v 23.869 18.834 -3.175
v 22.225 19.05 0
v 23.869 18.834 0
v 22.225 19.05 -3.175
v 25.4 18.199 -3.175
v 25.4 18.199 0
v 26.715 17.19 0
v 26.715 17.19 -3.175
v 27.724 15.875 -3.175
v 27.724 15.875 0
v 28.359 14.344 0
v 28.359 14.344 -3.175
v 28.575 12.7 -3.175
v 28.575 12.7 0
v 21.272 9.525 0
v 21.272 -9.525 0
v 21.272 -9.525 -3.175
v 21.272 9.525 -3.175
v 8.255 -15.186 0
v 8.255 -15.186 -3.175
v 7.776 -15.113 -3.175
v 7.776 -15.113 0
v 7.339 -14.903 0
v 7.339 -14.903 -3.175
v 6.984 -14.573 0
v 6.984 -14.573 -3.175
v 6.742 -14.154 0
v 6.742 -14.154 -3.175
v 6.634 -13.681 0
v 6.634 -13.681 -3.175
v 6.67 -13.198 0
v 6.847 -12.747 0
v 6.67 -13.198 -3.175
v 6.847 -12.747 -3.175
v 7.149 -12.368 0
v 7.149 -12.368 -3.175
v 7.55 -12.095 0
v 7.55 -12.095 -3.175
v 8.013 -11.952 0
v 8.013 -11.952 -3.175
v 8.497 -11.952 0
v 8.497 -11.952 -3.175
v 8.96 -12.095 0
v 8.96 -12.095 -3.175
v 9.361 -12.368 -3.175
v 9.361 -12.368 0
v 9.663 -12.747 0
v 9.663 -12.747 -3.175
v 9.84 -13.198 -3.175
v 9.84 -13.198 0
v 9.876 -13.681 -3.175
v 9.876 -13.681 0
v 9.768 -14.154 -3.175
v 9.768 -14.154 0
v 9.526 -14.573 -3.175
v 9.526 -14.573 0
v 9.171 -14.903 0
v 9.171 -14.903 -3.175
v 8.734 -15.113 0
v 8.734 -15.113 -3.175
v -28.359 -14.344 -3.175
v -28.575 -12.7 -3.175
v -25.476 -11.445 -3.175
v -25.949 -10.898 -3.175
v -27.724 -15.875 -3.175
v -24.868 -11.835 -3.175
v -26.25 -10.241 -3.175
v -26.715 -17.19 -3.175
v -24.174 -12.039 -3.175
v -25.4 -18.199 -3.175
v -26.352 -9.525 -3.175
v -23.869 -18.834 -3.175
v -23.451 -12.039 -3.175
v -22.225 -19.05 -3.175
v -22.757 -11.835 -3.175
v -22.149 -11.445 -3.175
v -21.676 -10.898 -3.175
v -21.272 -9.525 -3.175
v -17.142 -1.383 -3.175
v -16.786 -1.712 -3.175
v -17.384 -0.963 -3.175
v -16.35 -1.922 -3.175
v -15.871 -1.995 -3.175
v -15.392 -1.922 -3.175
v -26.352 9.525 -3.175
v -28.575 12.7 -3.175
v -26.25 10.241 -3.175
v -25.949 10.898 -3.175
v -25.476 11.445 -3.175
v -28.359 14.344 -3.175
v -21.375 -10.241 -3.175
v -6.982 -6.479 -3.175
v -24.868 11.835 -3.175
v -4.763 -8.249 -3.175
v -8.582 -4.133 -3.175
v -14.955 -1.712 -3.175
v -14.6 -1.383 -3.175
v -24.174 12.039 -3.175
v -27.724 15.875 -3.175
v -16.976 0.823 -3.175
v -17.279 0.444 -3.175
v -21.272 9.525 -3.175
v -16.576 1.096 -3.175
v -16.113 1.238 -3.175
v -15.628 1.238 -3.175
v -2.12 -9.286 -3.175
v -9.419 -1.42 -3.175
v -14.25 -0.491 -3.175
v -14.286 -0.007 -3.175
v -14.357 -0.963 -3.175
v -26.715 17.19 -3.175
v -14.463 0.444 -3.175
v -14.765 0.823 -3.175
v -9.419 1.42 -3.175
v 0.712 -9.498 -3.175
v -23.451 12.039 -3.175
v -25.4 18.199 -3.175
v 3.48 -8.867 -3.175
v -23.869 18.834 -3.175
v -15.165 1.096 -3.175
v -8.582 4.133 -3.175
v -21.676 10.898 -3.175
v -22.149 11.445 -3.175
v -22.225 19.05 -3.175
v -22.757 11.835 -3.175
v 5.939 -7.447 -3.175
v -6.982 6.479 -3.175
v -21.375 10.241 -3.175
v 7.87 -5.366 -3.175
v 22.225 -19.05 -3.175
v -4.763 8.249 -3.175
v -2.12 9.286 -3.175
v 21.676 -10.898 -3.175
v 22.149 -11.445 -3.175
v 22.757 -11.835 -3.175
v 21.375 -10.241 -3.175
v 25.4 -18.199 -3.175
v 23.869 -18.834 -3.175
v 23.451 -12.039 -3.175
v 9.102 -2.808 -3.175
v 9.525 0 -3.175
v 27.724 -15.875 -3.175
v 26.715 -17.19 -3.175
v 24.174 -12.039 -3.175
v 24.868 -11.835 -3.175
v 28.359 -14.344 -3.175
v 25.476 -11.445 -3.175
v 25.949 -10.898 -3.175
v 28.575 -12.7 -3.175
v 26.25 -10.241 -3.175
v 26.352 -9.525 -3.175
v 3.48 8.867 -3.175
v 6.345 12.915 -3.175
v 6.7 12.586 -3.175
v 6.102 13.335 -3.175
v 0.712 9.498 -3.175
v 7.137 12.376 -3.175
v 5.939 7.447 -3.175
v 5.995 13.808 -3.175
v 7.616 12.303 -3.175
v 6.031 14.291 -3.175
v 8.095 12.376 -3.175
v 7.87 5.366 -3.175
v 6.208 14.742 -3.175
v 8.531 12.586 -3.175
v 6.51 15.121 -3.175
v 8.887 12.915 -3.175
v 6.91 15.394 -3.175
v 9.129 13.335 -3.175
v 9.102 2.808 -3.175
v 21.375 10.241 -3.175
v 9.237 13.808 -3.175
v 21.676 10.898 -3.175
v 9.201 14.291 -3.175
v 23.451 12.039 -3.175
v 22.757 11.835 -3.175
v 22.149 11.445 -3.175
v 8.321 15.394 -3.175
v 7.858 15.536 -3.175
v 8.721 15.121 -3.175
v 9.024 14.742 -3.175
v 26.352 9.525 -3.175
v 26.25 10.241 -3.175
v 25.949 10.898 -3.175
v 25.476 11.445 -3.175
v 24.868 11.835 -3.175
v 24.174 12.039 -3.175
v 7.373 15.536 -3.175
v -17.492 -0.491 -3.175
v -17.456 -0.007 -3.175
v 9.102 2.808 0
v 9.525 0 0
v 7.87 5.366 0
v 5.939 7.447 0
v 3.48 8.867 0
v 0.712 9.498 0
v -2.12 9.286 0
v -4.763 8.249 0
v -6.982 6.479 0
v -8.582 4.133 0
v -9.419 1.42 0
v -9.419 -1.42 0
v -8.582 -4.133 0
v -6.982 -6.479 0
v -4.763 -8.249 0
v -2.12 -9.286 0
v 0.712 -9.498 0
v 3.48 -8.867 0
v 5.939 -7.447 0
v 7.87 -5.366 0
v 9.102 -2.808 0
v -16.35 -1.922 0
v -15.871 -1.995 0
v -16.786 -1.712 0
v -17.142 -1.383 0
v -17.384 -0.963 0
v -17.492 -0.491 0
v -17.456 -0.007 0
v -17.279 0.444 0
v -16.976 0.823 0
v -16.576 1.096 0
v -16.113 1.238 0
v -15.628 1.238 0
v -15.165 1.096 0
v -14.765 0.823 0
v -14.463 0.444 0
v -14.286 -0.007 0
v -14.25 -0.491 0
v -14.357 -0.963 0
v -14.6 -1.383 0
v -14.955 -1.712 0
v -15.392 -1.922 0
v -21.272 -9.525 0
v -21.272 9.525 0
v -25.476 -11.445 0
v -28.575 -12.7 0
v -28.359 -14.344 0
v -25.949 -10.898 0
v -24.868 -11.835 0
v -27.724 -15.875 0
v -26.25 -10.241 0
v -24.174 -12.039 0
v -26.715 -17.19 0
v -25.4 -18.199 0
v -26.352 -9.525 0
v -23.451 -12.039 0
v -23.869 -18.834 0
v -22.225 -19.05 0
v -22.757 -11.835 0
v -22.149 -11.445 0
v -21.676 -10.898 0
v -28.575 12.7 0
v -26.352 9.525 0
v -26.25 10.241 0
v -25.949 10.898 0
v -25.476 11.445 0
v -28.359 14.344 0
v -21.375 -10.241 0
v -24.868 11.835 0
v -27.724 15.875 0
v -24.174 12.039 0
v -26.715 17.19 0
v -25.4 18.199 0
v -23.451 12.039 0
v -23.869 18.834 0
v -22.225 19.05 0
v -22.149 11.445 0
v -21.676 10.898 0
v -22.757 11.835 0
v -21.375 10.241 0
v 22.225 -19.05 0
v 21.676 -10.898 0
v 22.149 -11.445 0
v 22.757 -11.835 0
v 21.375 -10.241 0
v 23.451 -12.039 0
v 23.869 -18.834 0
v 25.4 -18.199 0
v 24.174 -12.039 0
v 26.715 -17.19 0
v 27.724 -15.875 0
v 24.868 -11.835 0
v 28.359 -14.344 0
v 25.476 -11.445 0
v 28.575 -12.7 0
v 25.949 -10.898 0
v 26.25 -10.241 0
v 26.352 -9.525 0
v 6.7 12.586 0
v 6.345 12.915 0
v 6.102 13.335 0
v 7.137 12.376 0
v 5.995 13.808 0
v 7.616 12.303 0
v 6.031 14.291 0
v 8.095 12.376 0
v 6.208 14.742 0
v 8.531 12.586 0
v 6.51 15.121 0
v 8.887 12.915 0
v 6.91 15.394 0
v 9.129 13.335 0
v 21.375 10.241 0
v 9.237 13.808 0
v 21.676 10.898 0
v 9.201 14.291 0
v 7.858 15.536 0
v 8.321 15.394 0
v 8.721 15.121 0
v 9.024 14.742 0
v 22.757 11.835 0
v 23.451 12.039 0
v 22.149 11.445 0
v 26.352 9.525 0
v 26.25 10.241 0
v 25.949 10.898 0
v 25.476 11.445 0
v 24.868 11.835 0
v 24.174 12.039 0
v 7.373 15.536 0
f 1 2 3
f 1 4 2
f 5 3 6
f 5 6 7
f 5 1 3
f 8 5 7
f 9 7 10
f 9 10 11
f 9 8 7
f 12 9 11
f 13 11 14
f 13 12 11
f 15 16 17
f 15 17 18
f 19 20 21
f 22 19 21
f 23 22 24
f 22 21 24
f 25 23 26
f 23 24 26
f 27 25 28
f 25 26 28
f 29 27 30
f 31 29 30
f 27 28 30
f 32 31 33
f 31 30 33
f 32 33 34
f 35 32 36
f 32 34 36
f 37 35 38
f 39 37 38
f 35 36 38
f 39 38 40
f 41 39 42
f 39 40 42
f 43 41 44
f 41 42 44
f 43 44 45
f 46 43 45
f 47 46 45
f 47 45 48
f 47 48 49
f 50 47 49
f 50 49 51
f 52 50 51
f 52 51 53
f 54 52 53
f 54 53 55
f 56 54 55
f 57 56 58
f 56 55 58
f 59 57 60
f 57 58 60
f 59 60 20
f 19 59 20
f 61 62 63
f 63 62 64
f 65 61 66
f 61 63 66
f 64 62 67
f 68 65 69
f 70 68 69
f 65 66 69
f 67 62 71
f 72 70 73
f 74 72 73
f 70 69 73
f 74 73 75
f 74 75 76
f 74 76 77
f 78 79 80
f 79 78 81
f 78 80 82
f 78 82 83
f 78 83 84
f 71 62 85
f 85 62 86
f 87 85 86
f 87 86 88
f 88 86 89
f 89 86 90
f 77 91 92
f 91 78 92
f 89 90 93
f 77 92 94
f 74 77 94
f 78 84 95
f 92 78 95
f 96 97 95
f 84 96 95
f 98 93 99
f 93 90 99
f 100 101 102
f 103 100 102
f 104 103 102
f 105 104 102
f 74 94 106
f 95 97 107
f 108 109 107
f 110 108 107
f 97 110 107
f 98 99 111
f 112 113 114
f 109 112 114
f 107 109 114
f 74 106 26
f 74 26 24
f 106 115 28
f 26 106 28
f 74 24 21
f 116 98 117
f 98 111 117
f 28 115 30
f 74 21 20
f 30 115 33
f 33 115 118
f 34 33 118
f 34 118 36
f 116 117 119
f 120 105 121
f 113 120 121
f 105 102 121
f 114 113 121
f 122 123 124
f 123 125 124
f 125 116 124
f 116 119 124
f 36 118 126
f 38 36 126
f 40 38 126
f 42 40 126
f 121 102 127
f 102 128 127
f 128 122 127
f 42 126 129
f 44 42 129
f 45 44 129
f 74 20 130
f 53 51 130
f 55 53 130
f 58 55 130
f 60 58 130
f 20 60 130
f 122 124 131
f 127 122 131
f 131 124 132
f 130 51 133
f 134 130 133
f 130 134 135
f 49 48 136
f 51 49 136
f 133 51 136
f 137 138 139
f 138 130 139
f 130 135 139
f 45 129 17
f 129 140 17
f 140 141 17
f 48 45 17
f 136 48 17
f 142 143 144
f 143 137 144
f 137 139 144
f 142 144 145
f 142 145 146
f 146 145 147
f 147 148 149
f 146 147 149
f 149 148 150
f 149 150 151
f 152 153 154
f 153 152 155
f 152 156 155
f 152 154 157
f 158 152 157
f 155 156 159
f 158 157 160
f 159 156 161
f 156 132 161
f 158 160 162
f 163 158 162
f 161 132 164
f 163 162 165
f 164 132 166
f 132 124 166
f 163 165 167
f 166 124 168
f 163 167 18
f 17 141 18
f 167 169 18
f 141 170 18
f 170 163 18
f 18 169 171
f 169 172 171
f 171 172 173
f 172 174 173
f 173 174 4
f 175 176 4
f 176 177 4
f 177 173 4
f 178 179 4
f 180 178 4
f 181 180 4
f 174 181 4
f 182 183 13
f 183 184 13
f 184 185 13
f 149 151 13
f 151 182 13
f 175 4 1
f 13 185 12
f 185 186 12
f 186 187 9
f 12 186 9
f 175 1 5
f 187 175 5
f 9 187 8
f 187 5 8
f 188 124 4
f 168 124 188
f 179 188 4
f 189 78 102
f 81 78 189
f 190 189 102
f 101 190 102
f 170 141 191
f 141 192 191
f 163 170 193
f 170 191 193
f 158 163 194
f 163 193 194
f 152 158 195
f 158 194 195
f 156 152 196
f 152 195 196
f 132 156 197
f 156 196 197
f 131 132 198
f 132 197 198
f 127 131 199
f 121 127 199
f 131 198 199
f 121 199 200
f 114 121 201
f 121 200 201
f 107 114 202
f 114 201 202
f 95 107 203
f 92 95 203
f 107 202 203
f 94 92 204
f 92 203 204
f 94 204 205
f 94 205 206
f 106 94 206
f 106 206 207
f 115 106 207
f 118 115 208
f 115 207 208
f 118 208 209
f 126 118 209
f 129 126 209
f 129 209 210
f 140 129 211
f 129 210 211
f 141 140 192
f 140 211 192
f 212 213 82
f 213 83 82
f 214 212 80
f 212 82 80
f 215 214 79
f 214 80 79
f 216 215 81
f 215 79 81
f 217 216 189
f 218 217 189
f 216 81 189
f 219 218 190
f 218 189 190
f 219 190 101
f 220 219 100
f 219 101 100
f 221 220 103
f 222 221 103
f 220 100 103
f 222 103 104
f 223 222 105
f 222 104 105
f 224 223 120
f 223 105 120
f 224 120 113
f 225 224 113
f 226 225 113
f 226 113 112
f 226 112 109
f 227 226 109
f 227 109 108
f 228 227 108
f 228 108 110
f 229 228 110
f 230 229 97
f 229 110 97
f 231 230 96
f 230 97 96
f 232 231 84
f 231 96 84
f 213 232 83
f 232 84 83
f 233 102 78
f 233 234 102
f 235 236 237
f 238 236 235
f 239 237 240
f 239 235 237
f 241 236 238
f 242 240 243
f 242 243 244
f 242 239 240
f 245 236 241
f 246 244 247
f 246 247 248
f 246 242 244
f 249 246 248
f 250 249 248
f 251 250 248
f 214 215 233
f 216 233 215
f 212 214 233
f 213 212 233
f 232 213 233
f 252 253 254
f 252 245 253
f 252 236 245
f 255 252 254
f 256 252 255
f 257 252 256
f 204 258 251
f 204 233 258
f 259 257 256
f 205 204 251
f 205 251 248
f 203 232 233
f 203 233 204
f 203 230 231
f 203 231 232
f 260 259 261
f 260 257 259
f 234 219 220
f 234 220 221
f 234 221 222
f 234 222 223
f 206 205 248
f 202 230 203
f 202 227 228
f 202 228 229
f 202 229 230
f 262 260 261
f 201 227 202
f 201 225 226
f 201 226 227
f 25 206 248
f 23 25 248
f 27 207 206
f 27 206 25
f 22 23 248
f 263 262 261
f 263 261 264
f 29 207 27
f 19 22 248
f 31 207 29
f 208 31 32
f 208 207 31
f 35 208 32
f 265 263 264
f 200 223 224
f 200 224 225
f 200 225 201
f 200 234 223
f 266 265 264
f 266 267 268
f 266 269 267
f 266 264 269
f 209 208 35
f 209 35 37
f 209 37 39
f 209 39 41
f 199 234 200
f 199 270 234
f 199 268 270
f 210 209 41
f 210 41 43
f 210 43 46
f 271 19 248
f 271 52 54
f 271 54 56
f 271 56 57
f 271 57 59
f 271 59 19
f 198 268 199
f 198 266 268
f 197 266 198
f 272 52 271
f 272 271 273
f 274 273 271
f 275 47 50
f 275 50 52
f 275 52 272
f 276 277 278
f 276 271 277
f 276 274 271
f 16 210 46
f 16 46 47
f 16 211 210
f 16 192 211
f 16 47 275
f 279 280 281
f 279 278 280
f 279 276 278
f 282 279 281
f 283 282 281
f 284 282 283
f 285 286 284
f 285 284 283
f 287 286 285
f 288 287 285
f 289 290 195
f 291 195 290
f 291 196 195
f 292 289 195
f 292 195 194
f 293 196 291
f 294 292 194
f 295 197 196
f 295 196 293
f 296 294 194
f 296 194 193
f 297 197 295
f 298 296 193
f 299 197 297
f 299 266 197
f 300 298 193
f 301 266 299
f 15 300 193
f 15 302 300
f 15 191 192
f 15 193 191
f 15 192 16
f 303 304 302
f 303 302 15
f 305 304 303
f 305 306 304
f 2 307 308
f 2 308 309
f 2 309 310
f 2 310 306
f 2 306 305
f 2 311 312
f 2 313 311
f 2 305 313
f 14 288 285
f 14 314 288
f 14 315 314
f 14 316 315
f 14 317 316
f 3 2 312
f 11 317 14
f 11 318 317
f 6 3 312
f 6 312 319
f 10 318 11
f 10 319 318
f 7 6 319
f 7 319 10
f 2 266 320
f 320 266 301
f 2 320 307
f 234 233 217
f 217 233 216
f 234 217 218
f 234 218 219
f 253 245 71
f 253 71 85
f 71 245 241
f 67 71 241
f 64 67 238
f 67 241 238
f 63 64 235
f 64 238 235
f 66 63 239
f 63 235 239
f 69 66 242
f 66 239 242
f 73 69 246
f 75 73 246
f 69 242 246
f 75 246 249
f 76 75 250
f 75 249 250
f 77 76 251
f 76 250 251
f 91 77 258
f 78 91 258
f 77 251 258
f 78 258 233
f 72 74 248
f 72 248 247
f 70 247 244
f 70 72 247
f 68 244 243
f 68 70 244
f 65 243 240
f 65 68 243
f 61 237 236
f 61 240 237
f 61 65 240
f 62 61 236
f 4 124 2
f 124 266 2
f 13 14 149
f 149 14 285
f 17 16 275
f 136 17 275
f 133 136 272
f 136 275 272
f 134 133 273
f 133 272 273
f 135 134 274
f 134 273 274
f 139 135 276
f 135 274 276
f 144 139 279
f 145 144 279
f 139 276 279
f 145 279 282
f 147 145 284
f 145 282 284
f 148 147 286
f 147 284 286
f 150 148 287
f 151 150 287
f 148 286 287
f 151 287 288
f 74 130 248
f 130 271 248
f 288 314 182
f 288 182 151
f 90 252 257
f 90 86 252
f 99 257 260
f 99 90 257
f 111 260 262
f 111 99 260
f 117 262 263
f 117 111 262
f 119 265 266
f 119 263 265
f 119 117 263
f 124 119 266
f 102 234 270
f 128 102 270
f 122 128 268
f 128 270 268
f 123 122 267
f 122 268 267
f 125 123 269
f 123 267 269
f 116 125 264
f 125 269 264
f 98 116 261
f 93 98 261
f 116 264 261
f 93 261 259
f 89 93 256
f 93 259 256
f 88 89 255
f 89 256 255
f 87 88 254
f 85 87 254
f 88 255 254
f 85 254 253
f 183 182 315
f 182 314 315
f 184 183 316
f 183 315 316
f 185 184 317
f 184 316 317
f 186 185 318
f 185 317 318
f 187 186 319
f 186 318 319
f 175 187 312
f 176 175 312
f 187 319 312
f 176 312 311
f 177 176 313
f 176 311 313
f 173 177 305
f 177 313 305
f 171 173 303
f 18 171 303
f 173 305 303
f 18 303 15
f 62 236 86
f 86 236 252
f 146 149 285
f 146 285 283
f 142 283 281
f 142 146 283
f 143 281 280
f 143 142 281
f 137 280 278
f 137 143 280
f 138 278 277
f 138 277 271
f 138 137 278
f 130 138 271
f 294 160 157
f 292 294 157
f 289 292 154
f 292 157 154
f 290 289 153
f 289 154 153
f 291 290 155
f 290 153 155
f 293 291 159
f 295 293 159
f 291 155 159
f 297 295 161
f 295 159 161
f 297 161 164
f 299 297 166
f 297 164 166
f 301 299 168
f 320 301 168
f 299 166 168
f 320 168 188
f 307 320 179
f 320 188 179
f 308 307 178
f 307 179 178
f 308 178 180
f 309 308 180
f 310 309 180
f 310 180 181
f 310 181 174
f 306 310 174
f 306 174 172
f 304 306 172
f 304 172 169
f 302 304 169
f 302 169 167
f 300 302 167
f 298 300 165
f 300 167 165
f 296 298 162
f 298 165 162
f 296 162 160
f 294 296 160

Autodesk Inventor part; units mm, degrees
ref_plane "YZ Plane" through (0, 0, 0) normal (1, 0, 0) x (0, 1, 0)
ref_plane "XZ Plane" through (0, 0, 0) normal (0, 1, 0) x (-1, 0, 0)
ref_plane "XY Plane" through (0, 0, 0) normal (0, 0, 1) x (1, 0, 0)
sketch "Sketch1" plane through (0, 0, 0) normal (0, 0, 1) x (1, 0, 0)
  line L0 (-28.575, 19.05) -> (28.575, 19.05)
  line L1 (28.575, 19.05) -> (28.575, -19.05)
  line L2 (28.575, -19.05) -> (-28.575, -19.05)
  line L3 (-28.575, -19.05) -> (-28.575, 19.05)
  circle A0 centre (0, 0) radius 9.525
  circle A1 centre (0, 0) radius 15.875
  line L4 (-26.3525, 9.525) -> (-21.2725, 9.525)
  line L5 (-21.2725, 9.525) -> (-21.2725, -9.525)
  line L6 (-21.2725, -9.525) -> (-26.3525, -9.525)
  line L7 (-26.3525, -9.525) -> (-26.3525, 9.525)
  arc A2 (-21.2725, 9.525) -> (-26.3525, 9.525) centre (-23.8125, 9.525) ccw
  arc A3 (-26.3525, -9.525) -> (-21.2725, -9.525) centre (-23.8125, -9.525) ccw
  line L8 (21.2725, 9.525) -> (26.3525, 9.525)
  line L9 (26.3525, 9.525) -> (26.3525, -9.525)
  line L10 (26.3525, -9.525) -> (21.2725, -9.525)
  line L11 (21.2725, -9.525) -> (21.2725, 9.525)
  arc A4 (26.3525, 9.525) -> (21.2725, 9.525) centre (23.8125, 9.525) ccw
  arc A5 (21.2725, -9.525) -> (26.3525, -9.525) centre (23.8125, -9.525) ccw
  point P0 (7.6157, 13.929)
  point P1 (-15.8707, -0.3691)
  point P2 (8.255, -13.5599)
  dimension "d5" = 31.75
  dimension "d0" = 19.05
  dimension "d1" = 19.05
  dimension "d2" = 38.1
  dimension "d3" = 28.575
  dimension "d4" = 57.15
  dimension "d8" = 360
  dimension "d11" = 4.7625
  dimension "d12" = 19.05
  dimension "d13" = 9.525
  dimension "d14" = 5.08
  dimension "d15" = 19.05
  dimension "d16" = 5.08
  dimension "d17" = 4.7625
  dimension "d33" = 8.255
extrude "Extrusion1" add sketch "Sketch1" against normal blind 3.175 contours L0 L1 L2 L3 | A1
hole "Hole1" at (7.6157, 13.929, 0) at (-15.8707, -0.3691, 0) at (8.255, -13.5599, 0) direction (0, 0, -1) diameter 3.2512 end through all
fillet "Fillet1" radius 6.35 4 edges at (28.575, 19.05, -1.5875) (-28.575, 19.05, -1.5875) (-28.575, -19.05, -1.5875) (28.575, -19.05, -1.5875)
equation "\"d4\" = 2 * d3"
equation "\"d17\" = d11"
properties part number "dewalt tom mounting plate"
